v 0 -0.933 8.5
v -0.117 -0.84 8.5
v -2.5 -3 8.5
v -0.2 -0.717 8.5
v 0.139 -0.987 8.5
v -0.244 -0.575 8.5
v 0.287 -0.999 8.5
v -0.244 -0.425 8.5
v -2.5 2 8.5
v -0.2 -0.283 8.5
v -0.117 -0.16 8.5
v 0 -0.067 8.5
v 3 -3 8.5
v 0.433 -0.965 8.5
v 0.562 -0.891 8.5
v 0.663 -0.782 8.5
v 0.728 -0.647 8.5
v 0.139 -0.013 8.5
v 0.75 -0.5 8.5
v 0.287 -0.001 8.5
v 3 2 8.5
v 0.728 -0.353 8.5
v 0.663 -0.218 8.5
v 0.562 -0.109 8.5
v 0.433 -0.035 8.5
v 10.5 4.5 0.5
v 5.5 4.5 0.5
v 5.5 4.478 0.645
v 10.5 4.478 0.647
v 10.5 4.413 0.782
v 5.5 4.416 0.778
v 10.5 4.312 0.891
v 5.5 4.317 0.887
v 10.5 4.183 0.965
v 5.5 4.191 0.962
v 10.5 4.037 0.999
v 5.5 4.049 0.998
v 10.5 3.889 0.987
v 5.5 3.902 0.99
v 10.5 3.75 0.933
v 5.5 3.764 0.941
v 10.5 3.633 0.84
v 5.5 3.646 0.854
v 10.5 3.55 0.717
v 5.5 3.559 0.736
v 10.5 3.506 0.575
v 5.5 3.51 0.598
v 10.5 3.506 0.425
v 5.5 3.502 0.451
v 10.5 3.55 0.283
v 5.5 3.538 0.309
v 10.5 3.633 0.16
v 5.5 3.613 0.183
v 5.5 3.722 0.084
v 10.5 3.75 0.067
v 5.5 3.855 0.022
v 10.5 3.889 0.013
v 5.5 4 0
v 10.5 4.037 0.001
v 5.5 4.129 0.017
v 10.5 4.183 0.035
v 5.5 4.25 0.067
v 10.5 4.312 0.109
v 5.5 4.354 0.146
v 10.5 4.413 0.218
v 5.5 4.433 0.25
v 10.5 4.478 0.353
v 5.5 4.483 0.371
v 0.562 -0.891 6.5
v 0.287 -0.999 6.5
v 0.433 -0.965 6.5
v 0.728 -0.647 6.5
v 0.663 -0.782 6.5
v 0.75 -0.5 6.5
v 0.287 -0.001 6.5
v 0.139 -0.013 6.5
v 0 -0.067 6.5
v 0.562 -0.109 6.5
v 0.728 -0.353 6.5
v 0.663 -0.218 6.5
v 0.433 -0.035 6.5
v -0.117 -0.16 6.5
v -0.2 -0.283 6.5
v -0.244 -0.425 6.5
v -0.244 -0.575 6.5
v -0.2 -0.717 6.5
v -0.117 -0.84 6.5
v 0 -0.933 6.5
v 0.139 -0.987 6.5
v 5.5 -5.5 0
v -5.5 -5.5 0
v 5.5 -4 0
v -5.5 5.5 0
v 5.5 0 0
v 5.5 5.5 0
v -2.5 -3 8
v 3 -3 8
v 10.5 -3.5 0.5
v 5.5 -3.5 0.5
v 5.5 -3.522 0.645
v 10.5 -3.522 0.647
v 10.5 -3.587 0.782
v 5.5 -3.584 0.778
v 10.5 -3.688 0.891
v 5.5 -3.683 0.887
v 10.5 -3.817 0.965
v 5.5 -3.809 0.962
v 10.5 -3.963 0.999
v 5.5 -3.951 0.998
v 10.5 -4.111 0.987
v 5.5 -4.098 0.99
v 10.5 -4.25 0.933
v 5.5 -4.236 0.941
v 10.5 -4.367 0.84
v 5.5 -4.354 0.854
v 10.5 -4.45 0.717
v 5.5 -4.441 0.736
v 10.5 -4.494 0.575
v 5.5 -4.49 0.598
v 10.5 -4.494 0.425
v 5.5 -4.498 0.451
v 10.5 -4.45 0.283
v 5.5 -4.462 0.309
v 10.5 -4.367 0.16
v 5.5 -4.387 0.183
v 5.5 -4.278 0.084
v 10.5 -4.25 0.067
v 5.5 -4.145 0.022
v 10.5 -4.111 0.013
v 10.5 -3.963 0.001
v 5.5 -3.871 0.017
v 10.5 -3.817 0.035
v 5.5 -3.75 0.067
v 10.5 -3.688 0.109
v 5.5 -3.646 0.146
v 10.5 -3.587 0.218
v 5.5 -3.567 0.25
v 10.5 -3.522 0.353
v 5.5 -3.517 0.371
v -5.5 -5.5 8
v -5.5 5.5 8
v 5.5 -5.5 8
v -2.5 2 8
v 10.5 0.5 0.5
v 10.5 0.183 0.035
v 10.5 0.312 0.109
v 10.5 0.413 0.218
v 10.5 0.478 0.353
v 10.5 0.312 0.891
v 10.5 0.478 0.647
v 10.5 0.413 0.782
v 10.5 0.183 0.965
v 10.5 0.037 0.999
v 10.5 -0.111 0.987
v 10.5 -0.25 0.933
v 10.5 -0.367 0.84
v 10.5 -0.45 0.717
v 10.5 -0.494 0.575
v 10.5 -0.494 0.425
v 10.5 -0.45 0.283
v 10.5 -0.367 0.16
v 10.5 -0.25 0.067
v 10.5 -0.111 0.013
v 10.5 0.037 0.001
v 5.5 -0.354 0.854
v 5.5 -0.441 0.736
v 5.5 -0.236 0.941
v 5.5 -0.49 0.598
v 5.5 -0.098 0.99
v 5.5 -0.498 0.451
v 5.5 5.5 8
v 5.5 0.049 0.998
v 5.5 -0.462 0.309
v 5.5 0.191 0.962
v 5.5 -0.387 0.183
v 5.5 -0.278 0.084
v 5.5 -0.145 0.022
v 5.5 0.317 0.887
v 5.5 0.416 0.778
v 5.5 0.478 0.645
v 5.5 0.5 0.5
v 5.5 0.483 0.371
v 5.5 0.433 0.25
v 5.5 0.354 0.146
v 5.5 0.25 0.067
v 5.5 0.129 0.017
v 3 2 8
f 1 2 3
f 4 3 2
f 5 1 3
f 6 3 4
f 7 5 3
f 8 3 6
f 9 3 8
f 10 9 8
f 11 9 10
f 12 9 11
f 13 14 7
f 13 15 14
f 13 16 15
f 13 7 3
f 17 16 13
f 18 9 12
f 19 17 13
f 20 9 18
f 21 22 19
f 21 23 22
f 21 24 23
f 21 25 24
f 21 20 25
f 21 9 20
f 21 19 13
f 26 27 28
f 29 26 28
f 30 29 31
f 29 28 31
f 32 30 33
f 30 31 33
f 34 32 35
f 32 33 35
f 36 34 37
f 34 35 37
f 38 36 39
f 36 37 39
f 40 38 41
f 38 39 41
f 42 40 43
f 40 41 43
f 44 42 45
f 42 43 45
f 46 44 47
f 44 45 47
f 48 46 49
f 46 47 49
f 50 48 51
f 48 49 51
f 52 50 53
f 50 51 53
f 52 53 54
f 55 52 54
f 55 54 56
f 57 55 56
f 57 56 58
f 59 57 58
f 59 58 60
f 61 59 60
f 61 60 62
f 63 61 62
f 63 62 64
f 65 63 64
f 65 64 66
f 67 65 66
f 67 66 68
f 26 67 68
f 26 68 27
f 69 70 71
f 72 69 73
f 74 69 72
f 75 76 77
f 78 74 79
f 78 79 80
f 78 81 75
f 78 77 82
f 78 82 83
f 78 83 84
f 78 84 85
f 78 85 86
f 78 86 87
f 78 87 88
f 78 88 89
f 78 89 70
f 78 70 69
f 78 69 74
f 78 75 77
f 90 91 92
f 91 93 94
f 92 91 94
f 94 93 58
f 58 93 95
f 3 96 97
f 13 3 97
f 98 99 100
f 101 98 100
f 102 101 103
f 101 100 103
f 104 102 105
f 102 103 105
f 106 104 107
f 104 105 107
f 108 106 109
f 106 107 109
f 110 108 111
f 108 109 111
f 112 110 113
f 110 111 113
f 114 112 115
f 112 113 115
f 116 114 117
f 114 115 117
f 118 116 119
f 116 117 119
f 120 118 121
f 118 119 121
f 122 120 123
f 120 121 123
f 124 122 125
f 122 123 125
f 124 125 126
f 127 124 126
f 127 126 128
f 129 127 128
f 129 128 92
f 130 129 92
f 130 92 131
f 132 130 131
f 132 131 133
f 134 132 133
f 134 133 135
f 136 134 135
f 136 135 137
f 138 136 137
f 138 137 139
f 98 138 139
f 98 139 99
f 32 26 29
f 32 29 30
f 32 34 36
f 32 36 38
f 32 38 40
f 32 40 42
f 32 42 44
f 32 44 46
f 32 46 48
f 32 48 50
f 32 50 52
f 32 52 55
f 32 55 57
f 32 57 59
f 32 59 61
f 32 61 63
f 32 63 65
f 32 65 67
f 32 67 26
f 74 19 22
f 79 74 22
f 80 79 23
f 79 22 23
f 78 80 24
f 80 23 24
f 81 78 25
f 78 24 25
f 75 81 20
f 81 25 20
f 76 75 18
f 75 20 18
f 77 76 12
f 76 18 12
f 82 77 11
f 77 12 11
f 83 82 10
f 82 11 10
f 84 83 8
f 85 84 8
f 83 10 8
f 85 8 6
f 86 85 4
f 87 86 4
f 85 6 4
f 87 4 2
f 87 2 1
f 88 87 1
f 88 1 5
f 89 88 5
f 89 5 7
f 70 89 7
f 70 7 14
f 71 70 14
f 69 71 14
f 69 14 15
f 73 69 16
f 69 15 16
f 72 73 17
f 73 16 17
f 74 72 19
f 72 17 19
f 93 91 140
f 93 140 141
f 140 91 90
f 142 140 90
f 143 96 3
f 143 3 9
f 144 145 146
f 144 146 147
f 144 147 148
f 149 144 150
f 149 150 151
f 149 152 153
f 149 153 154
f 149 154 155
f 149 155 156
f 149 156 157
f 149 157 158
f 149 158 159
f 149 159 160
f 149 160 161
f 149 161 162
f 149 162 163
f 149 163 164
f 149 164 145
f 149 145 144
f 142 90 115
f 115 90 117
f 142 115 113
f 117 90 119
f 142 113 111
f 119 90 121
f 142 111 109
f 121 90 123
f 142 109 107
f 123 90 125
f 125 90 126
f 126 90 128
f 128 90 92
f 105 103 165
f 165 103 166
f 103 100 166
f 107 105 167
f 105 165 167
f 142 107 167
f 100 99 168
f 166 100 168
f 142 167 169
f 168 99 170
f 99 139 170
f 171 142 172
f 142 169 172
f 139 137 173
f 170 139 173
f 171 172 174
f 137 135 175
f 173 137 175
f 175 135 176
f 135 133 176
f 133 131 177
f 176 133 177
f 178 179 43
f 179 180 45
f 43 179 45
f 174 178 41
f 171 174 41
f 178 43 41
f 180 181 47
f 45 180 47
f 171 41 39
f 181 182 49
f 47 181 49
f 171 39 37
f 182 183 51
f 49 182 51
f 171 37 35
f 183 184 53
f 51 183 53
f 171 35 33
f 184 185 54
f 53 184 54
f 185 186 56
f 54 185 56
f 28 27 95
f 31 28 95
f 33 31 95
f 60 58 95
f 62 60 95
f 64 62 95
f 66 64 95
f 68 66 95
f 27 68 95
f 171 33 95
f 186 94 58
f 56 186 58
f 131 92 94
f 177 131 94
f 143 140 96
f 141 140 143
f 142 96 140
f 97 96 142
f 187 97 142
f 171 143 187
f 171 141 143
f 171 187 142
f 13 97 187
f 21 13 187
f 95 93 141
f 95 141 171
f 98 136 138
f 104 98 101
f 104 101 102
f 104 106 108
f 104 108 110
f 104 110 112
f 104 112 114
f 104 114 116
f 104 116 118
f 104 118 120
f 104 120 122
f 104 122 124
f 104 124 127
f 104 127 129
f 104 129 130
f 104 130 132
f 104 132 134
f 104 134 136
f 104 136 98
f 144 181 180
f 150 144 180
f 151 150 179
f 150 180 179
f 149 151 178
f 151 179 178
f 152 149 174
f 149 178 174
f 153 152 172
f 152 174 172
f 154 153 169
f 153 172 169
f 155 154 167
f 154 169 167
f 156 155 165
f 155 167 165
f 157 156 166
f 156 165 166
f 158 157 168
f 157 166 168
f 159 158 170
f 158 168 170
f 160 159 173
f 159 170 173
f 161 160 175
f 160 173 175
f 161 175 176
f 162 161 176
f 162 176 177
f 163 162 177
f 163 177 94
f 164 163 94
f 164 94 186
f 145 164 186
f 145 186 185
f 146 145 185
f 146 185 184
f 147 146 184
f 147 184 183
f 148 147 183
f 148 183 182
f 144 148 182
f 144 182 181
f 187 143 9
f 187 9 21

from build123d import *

# Parameters (mm, degrees)
SKETCH_W     = 11
SKETCH_H     = 11
PAD_DEPTH    = 8
SKETCH001_R  = 0.5
PAD001_DEPTH = 5
SKETCH002_W  = 5.5
SKETCH002_H  = 5
PAD002_DEPTH = 0.5
SKETCH003_R  = 0.5
POCKET_DEPTH = 2


with BuildPart() as part:
    # Sketch → Pad (new body)
    with BuildSketch(Plane.XY):
        Rectangle(SKETCH_W, SKETCH_H)
    extrude(amount=PAD_DEPTH)

    # Sketch001 (on Face2 of Pad) → Pad001 (join)
    with BuildSketch(Plane.YZ.offset(5.5)):
        with Locations((-4, 0.5)):
            Circle(SKETCH001_R)
        with Locations((0, 0.5)):
            Circle(SKETCH001_R)
        with Locations((4, 0.5)):
            Circle(SKETCH001_R)
    extrude(amount=PAD001_DEPTH)

    # Sketch002 (on Face5 of Pad001) → Pad002 (join)
    with BuildSketch(Plane.XY.offset(8)):
        with Locations((0.25, -0.5)):
            Rectangle(SKETCH002_W, SKETCH002_H)
    extrude(amount=PAD002_DEPTH)

    # Sketch003 (on Face17 of Pad002) → Pocket (cut)
    with BuildSketch(Plane.XY.offset(8.5)):
        with Locations((0.25, -0.5)):
            Circle(SKETCH003_R)
    extrude(amount=-POCKET_DEPTH, mode=Mode.SUBTRACT)


solid = part.part
